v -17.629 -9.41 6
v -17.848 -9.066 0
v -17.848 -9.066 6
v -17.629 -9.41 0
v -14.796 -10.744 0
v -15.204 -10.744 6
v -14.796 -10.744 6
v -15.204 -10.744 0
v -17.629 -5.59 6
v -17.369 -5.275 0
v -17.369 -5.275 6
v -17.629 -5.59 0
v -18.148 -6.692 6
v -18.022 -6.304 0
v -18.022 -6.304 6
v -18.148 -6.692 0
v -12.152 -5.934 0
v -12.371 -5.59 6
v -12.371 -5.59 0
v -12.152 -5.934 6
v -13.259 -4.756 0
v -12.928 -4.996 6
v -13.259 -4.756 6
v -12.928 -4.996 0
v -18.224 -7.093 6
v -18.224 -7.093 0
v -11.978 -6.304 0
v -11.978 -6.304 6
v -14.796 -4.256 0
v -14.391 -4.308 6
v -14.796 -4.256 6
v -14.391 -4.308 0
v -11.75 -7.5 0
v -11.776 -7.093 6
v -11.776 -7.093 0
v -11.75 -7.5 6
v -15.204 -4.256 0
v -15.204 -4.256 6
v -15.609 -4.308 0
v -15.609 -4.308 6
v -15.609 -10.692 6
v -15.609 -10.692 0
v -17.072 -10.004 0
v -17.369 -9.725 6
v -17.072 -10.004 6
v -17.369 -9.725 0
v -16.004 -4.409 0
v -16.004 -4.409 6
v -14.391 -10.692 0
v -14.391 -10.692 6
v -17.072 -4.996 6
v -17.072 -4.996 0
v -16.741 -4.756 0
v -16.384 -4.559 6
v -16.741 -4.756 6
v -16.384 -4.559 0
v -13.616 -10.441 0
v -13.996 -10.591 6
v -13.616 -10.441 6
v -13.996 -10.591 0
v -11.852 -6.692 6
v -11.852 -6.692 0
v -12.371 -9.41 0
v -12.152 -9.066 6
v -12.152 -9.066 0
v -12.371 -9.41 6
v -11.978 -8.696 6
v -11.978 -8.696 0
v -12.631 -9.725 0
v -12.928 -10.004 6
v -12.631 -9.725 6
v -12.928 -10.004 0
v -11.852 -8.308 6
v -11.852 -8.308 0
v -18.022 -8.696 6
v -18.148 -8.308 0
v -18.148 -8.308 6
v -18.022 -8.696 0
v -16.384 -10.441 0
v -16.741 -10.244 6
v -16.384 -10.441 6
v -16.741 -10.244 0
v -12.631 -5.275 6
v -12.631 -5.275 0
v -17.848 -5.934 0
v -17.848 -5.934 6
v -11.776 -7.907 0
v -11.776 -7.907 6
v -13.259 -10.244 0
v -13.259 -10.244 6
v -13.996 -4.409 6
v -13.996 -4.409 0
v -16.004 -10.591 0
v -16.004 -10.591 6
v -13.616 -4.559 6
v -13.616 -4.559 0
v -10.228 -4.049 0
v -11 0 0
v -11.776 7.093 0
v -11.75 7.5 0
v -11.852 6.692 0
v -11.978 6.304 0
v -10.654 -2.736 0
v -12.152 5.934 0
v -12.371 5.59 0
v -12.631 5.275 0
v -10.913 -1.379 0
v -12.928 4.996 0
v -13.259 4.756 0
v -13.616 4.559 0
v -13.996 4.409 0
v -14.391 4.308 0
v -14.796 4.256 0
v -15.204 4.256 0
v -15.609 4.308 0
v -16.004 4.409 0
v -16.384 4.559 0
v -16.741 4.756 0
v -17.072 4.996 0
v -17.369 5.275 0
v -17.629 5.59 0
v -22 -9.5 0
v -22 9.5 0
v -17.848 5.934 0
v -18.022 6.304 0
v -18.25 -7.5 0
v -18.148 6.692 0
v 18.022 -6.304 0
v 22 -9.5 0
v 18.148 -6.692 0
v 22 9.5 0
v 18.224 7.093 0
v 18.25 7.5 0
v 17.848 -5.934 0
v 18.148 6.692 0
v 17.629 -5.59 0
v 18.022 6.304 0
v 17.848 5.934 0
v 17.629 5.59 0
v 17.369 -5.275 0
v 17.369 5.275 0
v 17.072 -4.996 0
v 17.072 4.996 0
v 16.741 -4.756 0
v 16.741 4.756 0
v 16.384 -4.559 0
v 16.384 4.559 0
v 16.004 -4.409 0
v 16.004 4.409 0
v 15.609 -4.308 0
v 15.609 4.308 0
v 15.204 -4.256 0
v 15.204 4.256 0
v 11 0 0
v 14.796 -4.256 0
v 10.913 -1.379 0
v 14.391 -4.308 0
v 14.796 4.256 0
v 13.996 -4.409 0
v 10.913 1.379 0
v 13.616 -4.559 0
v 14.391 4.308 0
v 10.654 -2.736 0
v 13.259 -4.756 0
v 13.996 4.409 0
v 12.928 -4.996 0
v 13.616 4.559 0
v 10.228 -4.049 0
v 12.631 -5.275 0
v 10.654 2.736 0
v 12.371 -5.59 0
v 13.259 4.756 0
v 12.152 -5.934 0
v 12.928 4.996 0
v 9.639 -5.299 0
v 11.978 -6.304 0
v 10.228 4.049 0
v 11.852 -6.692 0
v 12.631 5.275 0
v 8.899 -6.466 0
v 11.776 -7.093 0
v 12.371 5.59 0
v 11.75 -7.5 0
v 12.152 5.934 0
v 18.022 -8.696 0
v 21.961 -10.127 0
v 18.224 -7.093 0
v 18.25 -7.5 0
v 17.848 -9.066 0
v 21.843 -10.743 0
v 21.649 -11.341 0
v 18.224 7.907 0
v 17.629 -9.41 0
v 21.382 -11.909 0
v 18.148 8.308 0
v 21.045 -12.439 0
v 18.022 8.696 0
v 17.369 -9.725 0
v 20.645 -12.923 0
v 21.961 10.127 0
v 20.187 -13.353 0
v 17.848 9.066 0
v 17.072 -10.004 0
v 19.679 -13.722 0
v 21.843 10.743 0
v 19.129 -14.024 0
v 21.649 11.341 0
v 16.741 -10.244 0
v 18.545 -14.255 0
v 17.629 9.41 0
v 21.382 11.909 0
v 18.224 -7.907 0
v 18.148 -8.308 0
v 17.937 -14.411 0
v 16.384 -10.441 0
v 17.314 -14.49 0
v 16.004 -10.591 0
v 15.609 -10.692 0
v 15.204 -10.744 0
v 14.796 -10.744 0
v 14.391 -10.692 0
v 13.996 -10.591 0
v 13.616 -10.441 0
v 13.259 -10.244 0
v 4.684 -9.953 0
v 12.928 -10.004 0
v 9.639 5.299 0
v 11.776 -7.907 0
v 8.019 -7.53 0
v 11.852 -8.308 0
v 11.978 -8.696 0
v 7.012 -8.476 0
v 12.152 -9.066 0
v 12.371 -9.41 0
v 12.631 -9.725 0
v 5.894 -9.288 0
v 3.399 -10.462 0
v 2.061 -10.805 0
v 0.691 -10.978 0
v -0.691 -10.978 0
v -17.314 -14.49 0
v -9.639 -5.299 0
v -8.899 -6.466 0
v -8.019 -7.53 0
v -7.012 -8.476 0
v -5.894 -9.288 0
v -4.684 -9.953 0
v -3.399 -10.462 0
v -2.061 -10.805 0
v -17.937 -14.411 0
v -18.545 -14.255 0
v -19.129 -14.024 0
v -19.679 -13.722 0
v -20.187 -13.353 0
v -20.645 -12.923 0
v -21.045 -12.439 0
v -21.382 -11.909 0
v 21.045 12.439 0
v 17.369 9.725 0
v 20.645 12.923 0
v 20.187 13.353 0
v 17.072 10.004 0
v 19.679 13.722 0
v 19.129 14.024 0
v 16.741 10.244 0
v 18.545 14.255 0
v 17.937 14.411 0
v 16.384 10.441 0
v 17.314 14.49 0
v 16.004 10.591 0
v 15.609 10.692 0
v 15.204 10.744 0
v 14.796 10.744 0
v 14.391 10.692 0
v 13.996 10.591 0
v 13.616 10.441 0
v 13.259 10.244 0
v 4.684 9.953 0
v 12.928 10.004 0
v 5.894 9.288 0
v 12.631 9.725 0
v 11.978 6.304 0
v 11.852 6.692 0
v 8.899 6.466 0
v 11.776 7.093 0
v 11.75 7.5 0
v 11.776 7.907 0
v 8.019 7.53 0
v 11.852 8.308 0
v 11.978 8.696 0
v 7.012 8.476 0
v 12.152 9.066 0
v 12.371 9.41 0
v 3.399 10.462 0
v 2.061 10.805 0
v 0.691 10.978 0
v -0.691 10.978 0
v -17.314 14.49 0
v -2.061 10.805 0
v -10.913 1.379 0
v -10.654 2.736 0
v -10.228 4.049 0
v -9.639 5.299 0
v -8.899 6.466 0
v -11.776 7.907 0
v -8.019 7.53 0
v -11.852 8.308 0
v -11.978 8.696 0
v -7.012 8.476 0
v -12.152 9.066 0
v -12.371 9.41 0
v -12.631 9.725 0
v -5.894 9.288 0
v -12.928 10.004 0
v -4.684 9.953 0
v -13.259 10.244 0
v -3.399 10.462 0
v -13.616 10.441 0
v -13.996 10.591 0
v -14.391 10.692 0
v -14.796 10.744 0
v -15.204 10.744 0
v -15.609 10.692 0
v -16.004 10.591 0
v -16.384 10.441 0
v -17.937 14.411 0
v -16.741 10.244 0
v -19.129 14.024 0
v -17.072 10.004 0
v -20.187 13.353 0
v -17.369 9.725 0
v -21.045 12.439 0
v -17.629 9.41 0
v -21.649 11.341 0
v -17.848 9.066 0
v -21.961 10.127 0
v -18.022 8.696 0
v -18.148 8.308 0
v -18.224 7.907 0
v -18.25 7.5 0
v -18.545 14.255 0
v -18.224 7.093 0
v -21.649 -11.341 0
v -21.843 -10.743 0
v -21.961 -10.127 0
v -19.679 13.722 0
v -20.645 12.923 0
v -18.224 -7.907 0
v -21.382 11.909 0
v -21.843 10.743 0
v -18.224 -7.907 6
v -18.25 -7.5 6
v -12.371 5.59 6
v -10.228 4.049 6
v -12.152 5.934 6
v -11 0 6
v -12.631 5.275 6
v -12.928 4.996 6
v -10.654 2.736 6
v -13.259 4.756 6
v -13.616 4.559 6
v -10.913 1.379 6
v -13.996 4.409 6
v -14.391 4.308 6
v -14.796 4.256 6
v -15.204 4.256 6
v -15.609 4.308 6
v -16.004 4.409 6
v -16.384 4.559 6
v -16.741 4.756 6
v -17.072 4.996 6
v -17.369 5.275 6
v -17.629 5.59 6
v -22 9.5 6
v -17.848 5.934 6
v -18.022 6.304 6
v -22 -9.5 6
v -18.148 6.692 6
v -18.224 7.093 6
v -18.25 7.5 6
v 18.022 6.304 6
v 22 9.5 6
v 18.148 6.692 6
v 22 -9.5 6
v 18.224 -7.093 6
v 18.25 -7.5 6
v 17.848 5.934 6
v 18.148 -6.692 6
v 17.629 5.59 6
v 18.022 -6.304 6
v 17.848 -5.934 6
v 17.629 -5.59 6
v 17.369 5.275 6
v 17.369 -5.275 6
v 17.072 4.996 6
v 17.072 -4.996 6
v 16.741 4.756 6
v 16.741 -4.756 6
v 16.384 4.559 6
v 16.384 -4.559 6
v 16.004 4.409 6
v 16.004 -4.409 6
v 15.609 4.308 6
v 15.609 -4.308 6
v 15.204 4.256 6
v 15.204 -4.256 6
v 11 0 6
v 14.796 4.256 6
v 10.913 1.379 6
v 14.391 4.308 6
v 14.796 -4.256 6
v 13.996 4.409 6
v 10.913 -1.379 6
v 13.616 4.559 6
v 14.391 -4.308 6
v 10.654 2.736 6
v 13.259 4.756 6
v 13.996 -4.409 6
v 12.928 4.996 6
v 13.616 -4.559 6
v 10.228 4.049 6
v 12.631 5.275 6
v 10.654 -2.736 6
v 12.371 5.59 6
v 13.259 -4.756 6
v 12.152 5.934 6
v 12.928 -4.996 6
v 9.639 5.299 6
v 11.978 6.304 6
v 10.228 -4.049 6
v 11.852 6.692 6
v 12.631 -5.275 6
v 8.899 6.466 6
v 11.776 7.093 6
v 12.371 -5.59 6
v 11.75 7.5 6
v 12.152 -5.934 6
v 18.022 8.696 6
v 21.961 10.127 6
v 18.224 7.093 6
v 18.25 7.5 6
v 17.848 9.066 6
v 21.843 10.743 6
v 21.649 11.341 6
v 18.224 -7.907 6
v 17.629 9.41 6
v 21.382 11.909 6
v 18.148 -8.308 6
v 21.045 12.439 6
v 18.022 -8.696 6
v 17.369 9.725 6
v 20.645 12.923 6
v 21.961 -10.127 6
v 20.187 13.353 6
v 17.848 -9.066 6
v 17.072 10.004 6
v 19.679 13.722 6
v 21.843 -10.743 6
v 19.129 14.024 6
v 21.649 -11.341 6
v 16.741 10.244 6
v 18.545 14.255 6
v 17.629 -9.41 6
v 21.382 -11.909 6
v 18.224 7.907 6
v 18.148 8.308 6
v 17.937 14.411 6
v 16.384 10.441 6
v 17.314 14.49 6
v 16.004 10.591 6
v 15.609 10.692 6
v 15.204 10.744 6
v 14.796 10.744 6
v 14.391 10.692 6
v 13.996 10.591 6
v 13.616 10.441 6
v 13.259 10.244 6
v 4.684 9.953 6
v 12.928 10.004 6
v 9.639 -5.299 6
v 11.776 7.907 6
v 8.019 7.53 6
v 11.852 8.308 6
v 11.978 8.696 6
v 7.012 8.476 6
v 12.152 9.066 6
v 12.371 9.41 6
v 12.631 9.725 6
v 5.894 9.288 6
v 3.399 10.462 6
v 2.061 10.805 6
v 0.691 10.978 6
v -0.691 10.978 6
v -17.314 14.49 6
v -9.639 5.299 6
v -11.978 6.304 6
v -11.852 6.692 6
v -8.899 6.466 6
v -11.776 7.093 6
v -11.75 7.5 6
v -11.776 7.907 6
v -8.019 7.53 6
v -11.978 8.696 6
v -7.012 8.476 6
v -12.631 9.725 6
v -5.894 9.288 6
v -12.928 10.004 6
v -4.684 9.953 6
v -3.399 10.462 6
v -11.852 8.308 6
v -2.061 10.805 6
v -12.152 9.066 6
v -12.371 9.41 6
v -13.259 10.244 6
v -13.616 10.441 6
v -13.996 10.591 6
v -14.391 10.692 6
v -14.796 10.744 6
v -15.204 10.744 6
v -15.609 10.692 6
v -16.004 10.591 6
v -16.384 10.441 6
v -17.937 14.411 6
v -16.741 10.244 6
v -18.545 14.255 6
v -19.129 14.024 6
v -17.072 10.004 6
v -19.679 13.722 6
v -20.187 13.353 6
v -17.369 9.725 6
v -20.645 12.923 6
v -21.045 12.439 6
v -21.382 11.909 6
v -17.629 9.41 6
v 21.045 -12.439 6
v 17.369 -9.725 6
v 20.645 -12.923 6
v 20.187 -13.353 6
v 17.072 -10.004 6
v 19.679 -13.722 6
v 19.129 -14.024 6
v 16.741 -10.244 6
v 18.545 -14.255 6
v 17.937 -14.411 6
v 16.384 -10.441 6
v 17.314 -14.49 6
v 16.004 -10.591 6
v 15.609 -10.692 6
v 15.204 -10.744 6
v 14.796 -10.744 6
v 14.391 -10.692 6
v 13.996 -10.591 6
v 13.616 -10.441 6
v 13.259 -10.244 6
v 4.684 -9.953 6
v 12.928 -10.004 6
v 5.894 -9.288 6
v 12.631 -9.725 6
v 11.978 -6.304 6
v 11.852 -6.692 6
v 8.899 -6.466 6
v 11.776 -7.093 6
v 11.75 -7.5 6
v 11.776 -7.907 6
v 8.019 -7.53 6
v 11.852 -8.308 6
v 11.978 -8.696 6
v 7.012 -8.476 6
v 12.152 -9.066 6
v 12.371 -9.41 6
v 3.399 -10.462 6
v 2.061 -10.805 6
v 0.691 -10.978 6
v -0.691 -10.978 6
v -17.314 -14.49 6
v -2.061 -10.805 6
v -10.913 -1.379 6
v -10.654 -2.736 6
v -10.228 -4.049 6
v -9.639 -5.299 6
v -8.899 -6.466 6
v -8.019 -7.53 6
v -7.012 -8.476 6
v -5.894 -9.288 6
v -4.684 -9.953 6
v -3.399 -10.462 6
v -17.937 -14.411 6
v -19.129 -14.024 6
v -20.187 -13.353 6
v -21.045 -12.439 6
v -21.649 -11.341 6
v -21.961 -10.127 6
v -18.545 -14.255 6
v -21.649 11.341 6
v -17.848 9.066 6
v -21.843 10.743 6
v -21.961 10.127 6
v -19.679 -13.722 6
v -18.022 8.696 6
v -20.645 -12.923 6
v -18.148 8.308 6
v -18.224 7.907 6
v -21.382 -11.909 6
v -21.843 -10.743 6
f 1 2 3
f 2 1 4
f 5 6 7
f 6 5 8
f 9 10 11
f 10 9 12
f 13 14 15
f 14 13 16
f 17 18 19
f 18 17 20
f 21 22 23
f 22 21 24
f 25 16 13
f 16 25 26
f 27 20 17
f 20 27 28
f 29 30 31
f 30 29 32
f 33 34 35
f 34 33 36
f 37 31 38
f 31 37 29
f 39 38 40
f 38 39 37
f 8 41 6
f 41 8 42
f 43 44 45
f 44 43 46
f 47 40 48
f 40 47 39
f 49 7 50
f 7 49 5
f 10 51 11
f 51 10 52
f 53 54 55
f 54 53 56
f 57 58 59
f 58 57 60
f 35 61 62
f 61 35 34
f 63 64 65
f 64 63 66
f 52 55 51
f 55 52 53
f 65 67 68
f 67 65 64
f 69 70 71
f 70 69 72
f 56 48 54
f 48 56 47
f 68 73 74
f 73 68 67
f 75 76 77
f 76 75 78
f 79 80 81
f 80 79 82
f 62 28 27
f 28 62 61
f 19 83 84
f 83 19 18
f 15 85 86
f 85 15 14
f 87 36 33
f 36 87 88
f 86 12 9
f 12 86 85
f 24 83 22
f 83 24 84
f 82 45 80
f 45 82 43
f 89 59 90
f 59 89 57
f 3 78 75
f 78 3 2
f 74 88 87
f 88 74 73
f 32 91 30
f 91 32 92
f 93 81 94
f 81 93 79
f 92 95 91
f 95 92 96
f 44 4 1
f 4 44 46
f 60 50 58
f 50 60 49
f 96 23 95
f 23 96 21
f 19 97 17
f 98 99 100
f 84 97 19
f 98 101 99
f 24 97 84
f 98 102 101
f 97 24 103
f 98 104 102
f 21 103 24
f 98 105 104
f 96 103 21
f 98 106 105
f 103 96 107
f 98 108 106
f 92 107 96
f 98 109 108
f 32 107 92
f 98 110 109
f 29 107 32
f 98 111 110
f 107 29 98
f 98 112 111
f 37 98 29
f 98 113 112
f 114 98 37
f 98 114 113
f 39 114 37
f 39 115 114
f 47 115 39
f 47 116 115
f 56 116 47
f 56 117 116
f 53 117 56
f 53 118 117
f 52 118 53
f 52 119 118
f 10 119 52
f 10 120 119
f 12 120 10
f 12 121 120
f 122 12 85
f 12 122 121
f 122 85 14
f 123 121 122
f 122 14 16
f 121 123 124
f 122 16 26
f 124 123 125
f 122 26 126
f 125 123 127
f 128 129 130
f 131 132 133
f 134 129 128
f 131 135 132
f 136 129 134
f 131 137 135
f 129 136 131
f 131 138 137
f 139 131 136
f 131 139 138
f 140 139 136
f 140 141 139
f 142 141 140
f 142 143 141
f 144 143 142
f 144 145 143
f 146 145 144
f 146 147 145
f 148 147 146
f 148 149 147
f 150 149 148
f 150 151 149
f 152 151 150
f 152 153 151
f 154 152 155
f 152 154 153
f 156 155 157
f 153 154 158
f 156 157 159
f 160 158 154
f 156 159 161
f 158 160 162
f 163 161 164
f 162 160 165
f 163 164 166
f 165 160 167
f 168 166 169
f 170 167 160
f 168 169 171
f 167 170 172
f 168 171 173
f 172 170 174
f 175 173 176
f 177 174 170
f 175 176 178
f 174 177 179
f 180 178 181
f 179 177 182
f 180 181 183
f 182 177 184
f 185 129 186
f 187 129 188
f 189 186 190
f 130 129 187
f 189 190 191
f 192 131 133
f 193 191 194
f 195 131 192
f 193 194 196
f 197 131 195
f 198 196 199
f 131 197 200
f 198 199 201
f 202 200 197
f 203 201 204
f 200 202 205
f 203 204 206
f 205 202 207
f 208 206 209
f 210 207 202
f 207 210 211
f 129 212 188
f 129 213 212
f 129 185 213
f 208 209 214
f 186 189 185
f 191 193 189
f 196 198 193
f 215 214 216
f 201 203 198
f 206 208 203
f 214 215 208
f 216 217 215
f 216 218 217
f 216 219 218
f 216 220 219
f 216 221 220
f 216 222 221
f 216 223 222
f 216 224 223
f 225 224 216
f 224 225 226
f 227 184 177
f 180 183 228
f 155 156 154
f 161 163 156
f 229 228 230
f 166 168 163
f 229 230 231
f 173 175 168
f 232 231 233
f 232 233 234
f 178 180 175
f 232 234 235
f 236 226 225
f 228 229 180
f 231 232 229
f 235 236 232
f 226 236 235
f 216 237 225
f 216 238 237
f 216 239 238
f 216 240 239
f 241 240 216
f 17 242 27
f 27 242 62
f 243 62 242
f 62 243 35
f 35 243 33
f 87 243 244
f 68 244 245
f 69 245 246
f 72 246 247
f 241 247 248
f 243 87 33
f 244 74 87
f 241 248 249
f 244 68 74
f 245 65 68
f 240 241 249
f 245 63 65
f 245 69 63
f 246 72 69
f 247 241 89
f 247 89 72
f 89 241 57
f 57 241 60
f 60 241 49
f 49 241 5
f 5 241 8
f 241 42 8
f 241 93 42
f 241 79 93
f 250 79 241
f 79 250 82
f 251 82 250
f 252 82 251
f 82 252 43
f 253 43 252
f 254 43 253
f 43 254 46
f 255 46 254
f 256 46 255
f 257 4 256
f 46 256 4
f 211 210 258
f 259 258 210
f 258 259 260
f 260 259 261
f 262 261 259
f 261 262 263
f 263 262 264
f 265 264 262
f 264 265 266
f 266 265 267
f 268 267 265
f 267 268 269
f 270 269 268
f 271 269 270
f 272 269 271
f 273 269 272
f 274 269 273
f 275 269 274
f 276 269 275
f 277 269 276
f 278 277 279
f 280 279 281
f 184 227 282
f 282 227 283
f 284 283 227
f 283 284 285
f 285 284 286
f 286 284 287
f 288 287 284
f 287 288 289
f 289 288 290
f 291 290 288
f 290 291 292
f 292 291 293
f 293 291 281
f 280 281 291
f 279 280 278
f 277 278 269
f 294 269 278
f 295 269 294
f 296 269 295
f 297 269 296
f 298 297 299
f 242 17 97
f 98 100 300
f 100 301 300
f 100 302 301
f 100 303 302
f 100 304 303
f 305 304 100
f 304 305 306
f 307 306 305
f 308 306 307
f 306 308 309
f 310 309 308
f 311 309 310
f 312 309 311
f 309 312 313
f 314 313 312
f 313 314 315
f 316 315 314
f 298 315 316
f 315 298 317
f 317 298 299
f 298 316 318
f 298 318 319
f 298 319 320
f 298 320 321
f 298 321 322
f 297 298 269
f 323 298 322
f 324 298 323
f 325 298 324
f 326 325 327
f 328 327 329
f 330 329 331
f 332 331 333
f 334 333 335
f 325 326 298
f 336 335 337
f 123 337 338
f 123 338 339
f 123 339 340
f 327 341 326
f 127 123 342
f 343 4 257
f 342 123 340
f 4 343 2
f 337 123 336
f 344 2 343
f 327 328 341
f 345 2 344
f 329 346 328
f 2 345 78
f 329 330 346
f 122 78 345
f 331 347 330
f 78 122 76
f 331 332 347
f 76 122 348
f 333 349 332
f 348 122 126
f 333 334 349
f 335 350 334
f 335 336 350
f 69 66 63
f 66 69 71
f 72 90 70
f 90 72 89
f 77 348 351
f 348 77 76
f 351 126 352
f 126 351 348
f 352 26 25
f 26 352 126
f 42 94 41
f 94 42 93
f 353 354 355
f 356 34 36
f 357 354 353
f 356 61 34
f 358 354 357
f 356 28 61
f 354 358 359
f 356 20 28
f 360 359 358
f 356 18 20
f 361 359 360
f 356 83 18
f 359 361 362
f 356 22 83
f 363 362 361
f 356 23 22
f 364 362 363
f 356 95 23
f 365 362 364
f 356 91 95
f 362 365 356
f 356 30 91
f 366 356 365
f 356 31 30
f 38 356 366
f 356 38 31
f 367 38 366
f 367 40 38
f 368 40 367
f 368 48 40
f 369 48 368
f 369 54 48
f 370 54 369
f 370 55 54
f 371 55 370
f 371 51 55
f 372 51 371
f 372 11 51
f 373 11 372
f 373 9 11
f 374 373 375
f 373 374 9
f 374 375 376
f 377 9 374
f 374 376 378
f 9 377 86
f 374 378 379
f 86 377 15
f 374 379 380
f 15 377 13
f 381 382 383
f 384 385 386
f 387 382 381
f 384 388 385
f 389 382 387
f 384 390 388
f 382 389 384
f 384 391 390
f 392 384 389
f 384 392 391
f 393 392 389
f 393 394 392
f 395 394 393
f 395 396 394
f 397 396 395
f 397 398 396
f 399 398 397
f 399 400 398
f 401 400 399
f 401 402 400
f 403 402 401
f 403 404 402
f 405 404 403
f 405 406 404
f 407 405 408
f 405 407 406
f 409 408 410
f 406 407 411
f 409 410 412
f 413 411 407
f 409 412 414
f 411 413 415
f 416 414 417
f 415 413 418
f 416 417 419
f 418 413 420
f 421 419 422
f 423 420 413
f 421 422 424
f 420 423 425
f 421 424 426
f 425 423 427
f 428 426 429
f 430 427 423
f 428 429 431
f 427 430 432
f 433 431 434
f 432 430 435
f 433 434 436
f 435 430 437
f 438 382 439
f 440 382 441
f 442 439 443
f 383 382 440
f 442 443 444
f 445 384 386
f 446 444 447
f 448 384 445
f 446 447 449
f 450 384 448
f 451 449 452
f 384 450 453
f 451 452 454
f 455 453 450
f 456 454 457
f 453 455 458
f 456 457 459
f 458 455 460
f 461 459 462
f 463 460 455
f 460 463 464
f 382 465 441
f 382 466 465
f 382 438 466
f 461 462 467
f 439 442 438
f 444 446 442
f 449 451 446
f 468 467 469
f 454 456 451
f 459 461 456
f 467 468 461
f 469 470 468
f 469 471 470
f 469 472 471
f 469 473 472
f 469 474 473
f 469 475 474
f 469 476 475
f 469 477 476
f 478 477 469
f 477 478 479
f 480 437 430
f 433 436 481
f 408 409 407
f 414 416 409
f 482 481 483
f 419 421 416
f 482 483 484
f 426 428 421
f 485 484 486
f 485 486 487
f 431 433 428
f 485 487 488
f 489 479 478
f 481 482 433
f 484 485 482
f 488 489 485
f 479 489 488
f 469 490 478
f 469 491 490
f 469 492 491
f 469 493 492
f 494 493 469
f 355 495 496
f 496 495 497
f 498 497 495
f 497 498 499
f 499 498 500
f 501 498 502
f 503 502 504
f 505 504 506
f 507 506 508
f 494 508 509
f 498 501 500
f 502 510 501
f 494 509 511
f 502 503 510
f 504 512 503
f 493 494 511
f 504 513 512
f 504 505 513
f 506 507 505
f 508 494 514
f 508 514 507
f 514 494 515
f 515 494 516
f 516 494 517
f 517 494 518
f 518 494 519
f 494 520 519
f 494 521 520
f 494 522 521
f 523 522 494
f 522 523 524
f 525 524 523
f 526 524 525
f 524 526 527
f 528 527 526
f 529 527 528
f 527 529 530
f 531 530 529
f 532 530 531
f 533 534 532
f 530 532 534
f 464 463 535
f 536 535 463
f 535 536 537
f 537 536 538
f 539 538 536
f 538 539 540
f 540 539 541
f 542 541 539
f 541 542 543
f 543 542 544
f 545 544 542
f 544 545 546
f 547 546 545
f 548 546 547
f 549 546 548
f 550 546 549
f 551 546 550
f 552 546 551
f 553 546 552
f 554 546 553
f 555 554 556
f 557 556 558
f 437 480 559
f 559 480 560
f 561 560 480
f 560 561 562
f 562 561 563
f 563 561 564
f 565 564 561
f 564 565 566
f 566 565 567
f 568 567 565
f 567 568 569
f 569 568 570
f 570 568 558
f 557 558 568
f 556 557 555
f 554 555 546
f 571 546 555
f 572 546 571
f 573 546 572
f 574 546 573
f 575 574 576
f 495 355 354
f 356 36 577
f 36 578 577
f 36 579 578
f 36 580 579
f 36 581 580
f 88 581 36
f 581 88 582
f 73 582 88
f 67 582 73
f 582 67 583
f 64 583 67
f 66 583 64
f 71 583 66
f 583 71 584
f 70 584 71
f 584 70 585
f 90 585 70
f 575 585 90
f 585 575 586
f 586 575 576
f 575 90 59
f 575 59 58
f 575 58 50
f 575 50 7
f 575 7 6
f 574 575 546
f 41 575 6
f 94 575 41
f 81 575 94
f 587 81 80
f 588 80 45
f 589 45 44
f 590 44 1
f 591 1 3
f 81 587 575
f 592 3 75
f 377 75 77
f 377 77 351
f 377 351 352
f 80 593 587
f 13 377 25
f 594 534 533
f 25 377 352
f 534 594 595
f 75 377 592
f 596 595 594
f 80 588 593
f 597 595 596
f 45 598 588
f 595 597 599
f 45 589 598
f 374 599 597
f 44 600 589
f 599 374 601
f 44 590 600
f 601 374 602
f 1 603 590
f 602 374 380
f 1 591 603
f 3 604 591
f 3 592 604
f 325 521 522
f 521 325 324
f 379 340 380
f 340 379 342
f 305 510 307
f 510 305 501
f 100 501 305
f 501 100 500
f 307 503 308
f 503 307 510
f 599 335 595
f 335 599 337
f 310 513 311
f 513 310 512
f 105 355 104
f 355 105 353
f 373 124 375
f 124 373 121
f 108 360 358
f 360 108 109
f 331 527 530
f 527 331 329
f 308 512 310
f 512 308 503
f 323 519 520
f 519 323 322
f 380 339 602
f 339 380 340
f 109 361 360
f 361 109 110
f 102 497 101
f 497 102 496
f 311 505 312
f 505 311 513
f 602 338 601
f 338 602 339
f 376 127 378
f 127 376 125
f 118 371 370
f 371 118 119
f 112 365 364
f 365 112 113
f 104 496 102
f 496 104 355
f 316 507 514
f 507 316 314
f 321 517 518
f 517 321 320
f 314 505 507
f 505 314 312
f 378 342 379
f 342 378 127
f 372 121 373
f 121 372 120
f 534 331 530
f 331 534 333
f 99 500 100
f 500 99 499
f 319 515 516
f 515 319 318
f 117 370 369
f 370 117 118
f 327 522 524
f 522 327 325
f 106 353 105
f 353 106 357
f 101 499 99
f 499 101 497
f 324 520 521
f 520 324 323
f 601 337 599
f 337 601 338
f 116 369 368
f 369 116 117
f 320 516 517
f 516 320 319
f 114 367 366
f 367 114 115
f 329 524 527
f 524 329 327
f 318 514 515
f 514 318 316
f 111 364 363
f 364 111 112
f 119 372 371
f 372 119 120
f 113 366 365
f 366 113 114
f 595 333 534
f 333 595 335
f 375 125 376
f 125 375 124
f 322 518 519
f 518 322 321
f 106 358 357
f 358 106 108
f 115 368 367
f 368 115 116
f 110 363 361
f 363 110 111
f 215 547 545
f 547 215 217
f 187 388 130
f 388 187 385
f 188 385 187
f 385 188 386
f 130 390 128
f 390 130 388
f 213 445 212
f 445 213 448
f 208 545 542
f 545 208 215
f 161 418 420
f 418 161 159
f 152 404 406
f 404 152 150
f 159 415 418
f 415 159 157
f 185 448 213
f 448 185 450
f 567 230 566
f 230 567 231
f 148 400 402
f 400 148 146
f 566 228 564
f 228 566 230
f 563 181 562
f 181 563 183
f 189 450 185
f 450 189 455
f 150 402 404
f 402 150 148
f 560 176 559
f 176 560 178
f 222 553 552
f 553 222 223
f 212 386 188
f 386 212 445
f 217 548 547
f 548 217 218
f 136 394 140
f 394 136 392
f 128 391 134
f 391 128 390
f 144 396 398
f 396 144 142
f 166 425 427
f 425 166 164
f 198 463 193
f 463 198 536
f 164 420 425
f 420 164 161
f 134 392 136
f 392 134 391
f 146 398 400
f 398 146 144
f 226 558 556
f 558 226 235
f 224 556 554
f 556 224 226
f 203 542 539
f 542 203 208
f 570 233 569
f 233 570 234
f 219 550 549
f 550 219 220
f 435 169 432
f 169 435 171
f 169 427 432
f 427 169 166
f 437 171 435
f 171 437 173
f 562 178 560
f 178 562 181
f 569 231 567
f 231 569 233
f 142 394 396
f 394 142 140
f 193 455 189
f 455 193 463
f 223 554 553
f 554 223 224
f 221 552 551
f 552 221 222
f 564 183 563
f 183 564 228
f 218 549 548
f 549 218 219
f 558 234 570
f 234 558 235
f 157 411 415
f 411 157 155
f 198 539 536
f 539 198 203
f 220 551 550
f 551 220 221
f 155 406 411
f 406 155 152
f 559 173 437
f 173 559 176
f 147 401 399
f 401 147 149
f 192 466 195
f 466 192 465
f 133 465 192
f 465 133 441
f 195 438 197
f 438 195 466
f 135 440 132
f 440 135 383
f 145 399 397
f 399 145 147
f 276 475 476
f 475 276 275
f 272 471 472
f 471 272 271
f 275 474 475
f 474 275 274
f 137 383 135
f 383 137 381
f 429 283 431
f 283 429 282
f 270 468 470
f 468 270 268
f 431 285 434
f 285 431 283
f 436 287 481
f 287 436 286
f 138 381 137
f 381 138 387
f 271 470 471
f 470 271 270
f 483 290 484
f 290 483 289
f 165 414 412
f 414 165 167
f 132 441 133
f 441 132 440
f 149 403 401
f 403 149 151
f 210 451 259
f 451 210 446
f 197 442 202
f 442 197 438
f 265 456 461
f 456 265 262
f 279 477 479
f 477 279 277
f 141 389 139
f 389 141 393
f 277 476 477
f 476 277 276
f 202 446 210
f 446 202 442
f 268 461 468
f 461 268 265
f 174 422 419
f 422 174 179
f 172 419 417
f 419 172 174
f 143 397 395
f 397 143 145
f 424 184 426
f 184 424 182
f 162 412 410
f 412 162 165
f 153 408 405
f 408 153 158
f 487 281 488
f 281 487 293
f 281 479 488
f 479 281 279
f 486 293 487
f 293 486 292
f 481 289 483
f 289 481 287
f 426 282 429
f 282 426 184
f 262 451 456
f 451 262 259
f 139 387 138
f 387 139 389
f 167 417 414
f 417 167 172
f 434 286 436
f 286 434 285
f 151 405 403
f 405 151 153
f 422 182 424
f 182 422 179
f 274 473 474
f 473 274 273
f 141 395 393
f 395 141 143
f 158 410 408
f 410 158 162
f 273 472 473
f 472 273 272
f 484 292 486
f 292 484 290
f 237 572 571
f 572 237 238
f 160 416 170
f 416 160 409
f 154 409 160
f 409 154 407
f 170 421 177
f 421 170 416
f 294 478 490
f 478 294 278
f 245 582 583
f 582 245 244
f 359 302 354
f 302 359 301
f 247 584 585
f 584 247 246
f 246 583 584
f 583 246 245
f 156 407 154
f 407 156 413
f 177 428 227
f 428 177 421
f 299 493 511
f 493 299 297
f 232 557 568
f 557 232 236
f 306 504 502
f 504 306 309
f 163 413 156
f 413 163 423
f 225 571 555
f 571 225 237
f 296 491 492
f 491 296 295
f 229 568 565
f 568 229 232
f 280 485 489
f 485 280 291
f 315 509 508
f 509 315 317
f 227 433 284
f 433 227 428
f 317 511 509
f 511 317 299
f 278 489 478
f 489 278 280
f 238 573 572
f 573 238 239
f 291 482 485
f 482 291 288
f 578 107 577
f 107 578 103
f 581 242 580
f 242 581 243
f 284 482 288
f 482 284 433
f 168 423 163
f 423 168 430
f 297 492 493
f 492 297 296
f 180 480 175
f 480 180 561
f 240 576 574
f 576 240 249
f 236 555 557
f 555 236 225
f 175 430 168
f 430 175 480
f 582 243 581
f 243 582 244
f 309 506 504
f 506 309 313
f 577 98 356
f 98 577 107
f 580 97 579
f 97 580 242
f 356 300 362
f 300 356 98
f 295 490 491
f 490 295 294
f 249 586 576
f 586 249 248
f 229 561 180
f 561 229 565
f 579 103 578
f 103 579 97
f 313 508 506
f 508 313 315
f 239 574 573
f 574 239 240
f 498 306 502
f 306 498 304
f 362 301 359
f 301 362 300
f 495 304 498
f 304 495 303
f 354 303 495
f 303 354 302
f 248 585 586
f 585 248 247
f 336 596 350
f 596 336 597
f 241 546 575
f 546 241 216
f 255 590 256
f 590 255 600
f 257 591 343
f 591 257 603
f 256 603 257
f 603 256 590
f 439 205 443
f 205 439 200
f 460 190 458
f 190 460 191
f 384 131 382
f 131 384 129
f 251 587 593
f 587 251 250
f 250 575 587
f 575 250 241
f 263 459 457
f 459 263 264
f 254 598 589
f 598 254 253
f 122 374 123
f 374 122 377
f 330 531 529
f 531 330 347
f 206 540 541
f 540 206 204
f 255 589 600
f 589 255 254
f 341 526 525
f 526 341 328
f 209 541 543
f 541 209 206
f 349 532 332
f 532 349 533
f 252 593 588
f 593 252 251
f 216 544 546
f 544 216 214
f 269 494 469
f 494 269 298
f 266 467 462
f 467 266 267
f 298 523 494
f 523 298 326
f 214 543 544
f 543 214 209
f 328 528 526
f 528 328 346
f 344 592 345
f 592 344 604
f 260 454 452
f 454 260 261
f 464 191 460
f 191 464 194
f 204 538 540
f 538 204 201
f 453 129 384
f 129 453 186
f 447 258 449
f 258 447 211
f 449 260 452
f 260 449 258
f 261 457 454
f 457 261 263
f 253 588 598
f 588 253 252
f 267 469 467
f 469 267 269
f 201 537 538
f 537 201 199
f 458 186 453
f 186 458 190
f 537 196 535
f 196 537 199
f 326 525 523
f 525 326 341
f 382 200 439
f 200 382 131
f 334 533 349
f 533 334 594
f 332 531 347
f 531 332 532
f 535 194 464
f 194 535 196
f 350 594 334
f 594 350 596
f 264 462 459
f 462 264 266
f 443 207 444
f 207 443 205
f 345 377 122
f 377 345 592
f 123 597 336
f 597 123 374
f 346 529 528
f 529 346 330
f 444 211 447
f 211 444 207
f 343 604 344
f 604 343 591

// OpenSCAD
$fn = 50;

difference() {
	union() {
		hull() {
			translate(v = [-17.0, 9.5, 0]) {
				cylinder(h = 6, r = 5);
			}
			translate(v = [17.0, 9.5, 0]) {
				cylinder(h = 6, r = 5);
			}
			translate(v = [-17.0, -9.5, 0]) {
				cylinder(h = 6, r = 5);
			}
			translate(v = [17.0, -9.5, 0]) {
				cylinder(h = 6, r = 5);
			}
		}
	}
	union() {
		translate(v = [-15.0, -7.5, 0]) {
			cylinder(h = 6, r = 3.25);
		}
		translate(v = [-15.0, 7.5, 0]) {
			cylinder(h = 6, r = 3.25);
		}
		translate(v = [15.0, -7.5, 0]) {
			cylinder(h = 6, r = 3.25);
		}
		translate(v = [15.0, 7.5, 0]) {
			cylinder(h = 6, r = 3.25);
		}
		cylinder(h = 6, r = 11.0);
	}
}
